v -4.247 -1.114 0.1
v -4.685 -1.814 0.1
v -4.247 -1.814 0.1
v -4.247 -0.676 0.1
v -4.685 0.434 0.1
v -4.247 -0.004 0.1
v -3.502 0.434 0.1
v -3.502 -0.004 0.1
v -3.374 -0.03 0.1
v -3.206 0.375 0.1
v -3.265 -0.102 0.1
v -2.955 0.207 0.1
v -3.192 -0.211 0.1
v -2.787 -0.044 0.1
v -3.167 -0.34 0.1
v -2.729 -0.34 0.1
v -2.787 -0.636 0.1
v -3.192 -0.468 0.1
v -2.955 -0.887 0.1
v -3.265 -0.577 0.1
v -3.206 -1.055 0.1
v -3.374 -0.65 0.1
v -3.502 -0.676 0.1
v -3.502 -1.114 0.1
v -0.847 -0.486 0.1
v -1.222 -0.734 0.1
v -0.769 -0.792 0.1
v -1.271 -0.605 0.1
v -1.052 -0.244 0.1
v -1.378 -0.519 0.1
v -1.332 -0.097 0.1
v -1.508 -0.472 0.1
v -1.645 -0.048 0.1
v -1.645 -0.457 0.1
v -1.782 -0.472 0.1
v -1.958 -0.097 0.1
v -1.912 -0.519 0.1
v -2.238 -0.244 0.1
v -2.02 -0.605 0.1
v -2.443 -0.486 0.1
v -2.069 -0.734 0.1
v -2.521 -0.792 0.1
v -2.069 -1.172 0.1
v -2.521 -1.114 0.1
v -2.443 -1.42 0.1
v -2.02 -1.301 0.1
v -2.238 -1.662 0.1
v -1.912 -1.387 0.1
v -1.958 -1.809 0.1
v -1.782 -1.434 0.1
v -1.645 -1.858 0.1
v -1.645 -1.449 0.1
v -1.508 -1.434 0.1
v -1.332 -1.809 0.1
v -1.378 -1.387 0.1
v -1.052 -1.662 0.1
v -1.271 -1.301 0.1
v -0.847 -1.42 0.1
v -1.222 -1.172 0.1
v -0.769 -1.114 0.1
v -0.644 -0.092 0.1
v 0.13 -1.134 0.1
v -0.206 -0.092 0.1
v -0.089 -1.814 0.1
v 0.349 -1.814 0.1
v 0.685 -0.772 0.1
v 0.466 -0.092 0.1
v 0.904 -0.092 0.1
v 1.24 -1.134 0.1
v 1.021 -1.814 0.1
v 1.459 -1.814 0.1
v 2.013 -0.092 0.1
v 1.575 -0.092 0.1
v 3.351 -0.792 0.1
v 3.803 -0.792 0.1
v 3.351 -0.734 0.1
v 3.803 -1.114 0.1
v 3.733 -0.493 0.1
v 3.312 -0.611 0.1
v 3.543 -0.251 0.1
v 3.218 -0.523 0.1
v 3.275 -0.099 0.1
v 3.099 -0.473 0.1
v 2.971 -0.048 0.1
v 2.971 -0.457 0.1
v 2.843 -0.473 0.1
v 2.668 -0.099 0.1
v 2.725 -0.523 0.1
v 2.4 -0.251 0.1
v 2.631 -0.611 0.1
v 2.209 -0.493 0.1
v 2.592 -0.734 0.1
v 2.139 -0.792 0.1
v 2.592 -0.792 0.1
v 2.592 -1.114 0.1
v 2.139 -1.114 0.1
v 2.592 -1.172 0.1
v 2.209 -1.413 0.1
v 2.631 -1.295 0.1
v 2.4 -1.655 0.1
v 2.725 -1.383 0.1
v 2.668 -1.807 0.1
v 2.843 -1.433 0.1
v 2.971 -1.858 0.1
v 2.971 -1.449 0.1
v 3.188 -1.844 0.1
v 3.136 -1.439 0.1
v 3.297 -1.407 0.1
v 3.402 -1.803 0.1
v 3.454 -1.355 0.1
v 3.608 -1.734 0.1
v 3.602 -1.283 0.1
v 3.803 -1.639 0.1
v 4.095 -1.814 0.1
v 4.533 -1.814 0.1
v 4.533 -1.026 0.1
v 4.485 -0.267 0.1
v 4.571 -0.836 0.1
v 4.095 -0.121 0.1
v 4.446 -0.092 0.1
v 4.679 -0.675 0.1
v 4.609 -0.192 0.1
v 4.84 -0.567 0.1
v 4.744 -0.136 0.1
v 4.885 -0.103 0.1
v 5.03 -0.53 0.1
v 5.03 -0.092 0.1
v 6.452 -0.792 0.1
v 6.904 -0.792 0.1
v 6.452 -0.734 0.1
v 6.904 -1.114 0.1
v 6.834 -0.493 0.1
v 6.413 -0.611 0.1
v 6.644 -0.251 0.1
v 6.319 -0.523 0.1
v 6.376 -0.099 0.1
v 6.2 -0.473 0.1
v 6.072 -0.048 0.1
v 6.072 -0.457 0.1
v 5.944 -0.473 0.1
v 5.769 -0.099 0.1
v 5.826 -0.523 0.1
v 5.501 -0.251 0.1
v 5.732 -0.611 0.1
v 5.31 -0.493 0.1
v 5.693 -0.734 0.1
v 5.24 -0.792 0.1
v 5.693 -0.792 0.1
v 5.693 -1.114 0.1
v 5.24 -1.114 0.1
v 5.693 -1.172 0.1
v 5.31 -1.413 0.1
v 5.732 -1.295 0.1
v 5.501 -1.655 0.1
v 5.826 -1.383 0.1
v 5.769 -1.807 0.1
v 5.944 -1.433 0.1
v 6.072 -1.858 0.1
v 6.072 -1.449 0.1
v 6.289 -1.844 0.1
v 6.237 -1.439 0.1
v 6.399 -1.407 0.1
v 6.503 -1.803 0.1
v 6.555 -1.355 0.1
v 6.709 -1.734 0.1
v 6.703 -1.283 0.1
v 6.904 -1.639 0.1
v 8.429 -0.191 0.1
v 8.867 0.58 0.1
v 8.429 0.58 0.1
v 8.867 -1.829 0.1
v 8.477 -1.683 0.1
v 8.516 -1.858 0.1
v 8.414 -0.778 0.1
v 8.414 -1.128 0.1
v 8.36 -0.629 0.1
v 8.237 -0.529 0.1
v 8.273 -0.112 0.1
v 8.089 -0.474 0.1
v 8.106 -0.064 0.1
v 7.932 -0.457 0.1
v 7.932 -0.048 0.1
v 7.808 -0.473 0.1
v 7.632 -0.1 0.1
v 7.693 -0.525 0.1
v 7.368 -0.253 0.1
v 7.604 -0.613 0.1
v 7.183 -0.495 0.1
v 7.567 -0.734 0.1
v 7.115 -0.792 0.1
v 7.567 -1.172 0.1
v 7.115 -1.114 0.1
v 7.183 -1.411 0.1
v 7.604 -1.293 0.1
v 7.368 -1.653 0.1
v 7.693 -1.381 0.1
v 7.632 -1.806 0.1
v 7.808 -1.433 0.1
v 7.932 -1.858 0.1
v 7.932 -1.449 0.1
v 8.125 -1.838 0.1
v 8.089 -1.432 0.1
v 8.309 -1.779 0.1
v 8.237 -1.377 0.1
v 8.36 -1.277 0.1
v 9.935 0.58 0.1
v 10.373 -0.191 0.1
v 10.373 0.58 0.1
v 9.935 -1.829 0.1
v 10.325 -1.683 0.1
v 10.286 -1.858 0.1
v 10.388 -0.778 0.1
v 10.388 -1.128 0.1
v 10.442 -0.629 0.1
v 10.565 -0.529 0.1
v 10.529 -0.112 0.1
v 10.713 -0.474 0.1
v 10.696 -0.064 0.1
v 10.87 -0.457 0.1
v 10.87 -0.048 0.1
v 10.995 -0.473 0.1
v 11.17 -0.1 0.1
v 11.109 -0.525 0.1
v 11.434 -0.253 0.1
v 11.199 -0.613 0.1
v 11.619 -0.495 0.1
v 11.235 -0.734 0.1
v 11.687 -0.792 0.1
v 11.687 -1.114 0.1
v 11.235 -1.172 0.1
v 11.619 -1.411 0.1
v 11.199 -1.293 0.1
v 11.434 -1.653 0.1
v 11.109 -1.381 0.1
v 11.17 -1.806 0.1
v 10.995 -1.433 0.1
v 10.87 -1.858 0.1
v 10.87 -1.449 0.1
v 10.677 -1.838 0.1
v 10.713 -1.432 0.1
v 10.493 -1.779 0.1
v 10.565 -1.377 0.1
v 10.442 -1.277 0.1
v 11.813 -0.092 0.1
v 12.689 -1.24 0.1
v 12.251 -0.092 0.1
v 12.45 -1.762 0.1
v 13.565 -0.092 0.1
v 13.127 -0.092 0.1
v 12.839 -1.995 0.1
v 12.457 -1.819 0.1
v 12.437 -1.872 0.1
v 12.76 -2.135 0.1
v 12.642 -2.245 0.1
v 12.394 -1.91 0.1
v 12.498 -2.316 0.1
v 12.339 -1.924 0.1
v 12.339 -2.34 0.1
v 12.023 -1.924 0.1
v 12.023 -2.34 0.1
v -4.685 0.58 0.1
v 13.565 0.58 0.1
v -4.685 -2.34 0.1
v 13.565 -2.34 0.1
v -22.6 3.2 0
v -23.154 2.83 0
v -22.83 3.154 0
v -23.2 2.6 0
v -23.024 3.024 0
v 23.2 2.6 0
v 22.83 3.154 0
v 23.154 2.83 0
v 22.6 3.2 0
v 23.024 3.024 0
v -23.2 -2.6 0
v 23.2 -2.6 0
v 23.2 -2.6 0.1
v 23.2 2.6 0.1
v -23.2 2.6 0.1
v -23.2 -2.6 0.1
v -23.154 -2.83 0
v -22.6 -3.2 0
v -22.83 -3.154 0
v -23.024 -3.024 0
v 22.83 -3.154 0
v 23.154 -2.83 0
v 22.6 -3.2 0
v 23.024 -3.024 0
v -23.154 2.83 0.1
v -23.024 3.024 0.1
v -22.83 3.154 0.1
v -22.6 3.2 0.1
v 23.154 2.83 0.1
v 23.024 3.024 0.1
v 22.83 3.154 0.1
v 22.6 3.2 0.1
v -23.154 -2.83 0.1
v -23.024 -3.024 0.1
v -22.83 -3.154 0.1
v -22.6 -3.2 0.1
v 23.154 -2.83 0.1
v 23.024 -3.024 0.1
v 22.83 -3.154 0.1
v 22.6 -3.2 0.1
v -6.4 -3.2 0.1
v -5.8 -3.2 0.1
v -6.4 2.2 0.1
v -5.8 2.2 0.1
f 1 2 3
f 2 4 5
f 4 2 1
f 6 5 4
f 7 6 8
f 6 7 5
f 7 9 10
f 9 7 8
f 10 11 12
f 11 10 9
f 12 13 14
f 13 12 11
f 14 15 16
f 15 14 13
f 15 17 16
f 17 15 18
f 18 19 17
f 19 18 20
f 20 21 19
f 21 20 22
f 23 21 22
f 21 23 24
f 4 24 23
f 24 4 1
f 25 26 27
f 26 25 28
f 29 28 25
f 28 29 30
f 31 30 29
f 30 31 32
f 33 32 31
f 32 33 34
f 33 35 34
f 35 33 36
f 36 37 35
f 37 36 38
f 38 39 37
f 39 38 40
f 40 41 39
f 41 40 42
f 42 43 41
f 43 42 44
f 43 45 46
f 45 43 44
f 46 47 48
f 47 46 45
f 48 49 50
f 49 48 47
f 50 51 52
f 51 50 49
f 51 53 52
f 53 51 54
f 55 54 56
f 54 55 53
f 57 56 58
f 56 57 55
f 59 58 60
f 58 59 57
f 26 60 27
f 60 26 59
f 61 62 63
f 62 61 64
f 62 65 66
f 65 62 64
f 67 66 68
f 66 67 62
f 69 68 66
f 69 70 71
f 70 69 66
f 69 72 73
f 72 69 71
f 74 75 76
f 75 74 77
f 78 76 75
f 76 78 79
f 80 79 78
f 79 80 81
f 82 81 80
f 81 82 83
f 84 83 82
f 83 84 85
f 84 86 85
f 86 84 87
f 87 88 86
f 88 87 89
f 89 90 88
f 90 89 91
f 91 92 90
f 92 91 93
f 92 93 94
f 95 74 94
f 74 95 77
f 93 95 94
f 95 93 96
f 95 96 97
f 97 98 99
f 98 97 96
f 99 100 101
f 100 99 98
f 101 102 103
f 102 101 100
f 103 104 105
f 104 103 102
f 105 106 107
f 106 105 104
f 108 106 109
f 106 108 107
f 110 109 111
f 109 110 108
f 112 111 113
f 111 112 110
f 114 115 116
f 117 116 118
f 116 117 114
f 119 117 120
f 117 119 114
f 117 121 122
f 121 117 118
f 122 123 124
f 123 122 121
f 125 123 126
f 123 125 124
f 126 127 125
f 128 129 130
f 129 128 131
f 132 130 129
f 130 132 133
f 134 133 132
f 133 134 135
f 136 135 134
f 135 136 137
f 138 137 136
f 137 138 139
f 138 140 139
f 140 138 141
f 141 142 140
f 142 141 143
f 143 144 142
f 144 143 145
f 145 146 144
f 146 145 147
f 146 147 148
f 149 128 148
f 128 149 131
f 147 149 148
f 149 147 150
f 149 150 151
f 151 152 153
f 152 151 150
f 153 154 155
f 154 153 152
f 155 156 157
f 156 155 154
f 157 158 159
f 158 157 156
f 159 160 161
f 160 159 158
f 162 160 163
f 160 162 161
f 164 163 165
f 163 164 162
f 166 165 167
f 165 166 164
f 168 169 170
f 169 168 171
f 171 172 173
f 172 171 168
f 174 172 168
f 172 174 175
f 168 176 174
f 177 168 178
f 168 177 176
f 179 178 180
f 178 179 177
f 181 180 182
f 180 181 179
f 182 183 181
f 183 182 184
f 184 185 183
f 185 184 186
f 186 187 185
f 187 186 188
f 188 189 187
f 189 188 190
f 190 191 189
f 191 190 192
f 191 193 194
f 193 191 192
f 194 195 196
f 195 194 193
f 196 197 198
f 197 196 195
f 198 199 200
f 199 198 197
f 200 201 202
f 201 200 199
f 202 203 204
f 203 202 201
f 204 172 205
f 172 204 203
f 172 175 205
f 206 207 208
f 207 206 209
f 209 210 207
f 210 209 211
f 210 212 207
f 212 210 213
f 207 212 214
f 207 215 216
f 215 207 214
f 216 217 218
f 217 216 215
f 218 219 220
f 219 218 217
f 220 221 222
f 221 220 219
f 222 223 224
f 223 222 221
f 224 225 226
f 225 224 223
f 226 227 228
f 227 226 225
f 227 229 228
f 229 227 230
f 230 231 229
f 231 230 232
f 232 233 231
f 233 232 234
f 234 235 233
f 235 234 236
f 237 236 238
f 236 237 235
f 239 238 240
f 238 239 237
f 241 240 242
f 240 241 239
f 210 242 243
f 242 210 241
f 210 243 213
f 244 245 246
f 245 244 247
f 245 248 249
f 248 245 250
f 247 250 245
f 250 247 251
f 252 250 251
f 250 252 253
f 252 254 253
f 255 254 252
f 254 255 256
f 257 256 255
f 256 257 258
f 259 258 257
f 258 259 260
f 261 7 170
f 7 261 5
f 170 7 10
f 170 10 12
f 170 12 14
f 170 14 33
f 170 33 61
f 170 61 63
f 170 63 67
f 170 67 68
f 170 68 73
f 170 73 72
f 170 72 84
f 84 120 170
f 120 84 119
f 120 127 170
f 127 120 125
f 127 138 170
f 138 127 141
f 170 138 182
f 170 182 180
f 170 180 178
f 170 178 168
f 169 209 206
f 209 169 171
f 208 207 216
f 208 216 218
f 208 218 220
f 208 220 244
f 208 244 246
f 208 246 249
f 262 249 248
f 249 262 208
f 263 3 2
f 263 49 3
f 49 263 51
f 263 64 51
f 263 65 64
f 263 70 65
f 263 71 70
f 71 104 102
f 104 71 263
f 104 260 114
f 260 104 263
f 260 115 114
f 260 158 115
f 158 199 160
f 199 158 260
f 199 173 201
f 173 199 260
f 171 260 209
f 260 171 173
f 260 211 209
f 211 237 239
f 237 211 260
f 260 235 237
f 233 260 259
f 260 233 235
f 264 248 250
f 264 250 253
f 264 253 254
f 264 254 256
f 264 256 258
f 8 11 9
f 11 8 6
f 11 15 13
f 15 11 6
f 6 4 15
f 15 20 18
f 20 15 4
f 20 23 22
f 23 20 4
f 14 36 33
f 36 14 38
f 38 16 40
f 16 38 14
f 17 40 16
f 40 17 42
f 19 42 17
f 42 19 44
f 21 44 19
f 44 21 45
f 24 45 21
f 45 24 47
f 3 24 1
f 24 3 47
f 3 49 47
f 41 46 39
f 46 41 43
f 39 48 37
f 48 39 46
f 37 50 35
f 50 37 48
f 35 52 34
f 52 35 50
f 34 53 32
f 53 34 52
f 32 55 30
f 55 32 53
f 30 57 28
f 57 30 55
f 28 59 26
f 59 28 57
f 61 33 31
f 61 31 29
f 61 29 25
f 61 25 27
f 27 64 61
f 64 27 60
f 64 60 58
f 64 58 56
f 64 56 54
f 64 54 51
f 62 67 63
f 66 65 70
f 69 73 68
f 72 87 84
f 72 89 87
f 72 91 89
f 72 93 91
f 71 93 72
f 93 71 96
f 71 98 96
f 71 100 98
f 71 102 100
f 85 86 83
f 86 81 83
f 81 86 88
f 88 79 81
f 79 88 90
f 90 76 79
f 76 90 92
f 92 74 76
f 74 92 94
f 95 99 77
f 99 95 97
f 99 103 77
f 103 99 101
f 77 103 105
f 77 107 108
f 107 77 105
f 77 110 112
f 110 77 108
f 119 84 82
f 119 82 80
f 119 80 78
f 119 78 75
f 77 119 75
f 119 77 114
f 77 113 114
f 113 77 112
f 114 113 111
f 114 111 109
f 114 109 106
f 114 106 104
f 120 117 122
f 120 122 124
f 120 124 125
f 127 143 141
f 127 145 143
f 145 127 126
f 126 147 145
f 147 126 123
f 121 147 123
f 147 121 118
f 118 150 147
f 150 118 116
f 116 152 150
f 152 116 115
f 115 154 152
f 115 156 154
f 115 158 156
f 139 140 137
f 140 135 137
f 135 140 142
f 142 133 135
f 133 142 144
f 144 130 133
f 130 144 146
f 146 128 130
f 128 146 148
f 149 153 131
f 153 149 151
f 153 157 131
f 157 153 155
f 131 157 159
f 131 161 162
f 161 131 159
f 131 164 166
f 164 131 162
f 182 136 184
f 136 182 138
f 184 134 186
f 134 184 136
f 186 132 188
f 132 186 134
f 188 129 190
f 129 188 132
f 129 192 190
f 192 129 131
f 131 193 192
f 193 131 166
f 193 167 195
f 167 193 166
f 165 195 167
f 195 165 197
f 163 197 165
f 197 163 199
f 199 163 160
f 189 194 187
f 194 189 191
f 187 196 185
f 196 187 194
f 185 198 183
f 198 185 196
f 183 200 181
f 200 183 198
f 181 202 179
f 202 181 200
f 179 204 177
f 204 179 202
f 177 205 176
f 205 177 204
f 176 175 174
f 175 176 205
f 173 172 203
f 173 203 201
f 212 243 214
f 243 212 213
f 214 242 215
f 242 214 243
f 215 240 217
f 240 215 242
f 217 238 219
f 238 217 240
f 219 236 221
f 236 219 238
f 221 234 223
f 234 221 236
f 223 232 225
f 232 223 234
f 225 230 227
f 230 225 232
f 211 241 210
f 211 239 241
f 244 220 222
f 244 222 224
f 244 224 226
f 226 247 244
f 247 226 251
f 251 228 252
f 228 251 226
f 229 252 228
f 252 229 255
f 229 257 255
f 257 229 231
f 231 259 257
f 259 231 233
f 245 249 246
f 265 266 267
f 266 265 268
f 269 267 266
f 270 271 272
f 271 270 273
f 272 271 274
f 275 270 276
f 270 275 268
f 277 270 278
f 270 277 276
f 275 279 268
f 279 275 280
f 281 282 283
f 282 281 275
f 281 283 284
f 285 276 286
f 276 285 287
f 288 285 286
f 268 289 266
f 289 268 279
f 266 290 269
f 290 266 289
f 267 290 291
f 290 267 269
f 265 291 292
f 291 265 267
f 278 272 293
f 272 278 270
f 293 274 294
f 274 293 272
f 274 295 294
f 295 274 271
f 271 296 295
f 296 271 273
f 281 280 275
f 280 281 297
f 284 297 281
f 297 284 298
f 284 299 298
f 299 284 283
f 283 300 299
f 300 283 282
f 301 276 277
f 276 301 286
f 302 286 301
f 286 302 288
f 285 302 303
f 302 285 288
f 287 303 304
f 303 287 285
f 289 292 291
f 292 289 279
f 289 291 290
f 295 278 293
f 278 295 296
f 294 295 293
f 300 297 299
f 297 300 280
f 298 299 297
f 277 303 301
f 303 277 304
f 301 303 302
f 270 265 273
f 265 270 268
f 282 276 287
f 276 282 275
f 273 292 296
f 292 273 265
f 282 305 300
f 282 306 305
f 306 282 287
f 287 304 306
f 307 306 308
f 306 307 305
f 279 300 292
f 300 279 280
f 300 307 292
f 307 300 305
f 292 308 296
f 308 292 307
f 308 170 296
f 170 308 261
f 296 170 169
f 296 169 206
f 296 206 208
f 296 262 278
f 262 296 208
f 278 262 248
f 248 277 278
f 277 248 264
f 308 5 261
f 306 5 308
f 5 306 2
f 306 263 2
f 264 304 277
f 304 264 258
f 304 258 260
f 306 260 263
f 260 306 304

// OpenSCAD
// file: ../p/box3u12.scad
use <../lib.scad>
function ldraw_lib__box3u12() = [
// 0 Box with 3 Parallel Faces without Any Edges
// 0 Name: box3u12.dat
// 0 Author: J.C. Tchang [tchang]
// 0 !LDRAW_ORG Primitive UPDATE 2014-02
// 0 !LICENSE Licensed under CC BY 4.0 : see CAreadme.txt
// 
// 0 BFC CERTIFY CCW
  [0,"BFC","CERTIFY"],
  [0,"BFC","CCW"],
// 
// 0 !HISTORY 2014-12-23 [PTadmin] Official Update 2014-02
// 
// 
// 4 16 -1 1 1 1 1 1 1 1 -1 -1 1 -1
  [4,16,-1,1,1,1,1,1,1,1,-1,-1,1,-1],
// 4 16 -1 1 1 -1 0 1 1 0 1 1 1 1
  [4,16,-1,1,1,-1,0,1,1,0,1,1,1,1],
// 4 16 1 1 -1 1 0 -1 -1 0 -1 -1 1 -1
  [4,16,1,1,-1,1,0,-1,-1,0,-1,-1,1,-1],
];
module ldraw_lib__box3u12(step=0, col=false, unit=2/5, alt=false, line=0.2, solid=!$preview)
    makepoly(ldraw_lib__box3u12(), step=step, col=col, unit=unit, alt=alt, line=line, solid=solid);
ldraw_lib__box3u12(line=0.2);
// file: ../p/1-4cyli.scad
use <../lib.scad>
function ldraw_lib__1_4cyli() = [
// 0 Cylinder 0.25
// 0 Name: 1-4cyli.dat
// 0 Author: James Jessiman
// 0 !LDRAW_ORG Primitive UPDATE 2012-01
// 0 !LICENSE Licensed under CC BY 4.0 : see CAreadme.txt
// 
// 0 BFC CERTIFY CCW
  [0,"BFC","CERTIFY"],
  [0,"BFC","CCW"],
// 
// 0 !HISTORY 2002-03-23 [sbliss] Added BFC statement.
// 0 !HISTORY 2002-04-25 [PTadmin] Official Update 2002-02
// 0 !HISTORY 2007-06-22 [PTadmin] Header formatted for Contributor Agreement
// 0 !HISTORY 2008-07-01 [PTadmin] Official Update 2008-01
// 0 !HISTORY 2012-02-16 [Philo] Changed to CCW
// 0 !HISTORY 2012-03-30 [PTadmin] Official Update 2012-01
// 
// 
// 4 16 1 1 0 0.9239 1 0.3827 0.9239 0 0.3827 1 0 0
  [4,16,1,1,0,0.9239,1,0.3827,0.9239,0,0.3827,1,0,0],
// 5 24 1 0 0 1 1 0 0.9239 0 0.3827 1 0 -1
  [5,24,1,0,0,1,1,0,0.9239,0,0.3827,1,0,-1],
// 4 16 0.9239 1 0.3827 0.7071 1 0.7071 0.7071 0 0.7071 0.9239 0 0.3827
  [4,16,0.9239,1,0.3827,0.7071,1,0.7071,0.7071,0,0.7071,0.9239,0,0.3827],
// 5 24 0.9239 0 0.3827 0.9239 1 0.3827 0.7071 0 0.7071 1 0 0
  [5,24,0.9239,0,0.3827,0.9239,1,0.3827,0.7071,0,0.7071,1,0,0],
// 4 16 0.7071 1 0.7071 0.3827 1 0.9239 0.3827 0 0.9239 0.7071 0 0.7071
  [4,16,0.7071,1,0.7071,0.3827,1,0.9239,0.3827,0,0.9239,0.7071,0,0.7071],
// 5 24 0.7071 0 0.7071 0.7071 1 0.7071 0.3827 0 0.9239 0.9239 0 0.3827
  [5,24,0.7071,0,0.7071,0.7071,1,0.7071,0.3827,0,0.9239,0.9239,0,0.3827],
// 4 16 0.3827 1 0.9239 0 1 1 0 0 1 0.3827 0 0.9239
  [4,16,0.3827,1,0.9239,0,1,1,0,0,1,0.3827,0,0.9239],
// 5 24 0.3827 0 0.9239 0.3827 1 0.9239 0 0 1 0.7071 0 0.7071
  [5,24,0.3827,0,0.9239,0.3827,1,0.9239,0,0,1,0.7071,0,0.7071],
// 5 24 0 0 1 0 1 1 0.3827 0 0.9239 -1 0 1
  [5,24,0,0,1,0,1,1,0.3827,0,0.9239,-1,0,1],
];
module ldraw_lib__1_4cyli(step=0, col=false, unit=2/5, alt=false, line=0.2, solid=!$preview)
    makepoly(ldraw_lib__1_4cyli(), step=step, col=col, unit=unit, alt=alt, line=line, solid=solid);
ldraw_lib__1_4cyli(line=0.2);
// file: ../p/1-4chrd.scad
use <../lib.scad>
function ldraw_lib__1_4chrd() = [
// 0 Chord 0.25
// 0 Name: 1-4chrd.dat
// 0 Author: Max Martin Richter [MMR1988]
// 0 !LDRAW_ORG Primitive UPDATE 2023-05
// 0 !LICENSE Licensed under CC BY 4.0 : see CAreadme.txt
// 
// 0 BFC CERTIFY CCW
  [0,"BFC","CERTIFY"],
  [0,"BFC","CCW"],
// 
// 0 !HISTORY 2004-04-22 [PTadmin] Official Update 2004-02
// 0 !HISTORY 2007-10-09 [PTadmin] Header formatted for Contributor Agreement
// 0 !HISTORY 2008-07-01 [PTadmin] Official Update 2008-01
// 0 !HISTORY 2012-08-02 [MMR1988] Re-creation with PrimGen2 and Rectifier
// 0 !HISTORY 2012-08-09 [PTadmin] Official Update 2012-02
// 0 !HISTORY 2023-10-27 [OrionP] Change author to MMR1988 from hafhead
// 0 !HISTORY 2023-10-31 [OrionP] Official Update 2023-05
// 
// 4 16 0.9239 0 0.3827 0.3827 0 0.9239 0 0 1 1 0 0
  [4,16,0.9239,0,0.3827,0.3827,0,0.9239,0,0,1,1,0,0],
// 3 16 0.7071 0 0.7071 0.3827 0 0.9239 0.9239 0 0.3827
  [3,16,0.7071,0,0.7071,0.3827,0,0.9239,0.9239,0,0.3827],
];
module ldraw_lib__1_4chrd(step=0, col=false, unit=2/5, alt=false, line=0.2, solid=!$preview)
    makepoly(ldraw_lib__1_4chrd(), step=step, col=col, unit=unit, alt=alt, line=line, solid=solid);
ldraw_lib__1_4chrd(line=0.2);
// main file
use <../lib.scad>
use <../p/1-4chrd.scad>
use <../p/1-4cyli.scad>
use <../p/box3u12.scad>
use <s/logo-ecoboost-powered-by-box.scad>
use <s/logo-ecoboost-powered-by.scad>
function ldraw_lib__6177969o() = [
// 0 Sticker  0.8 x  5.8 with Black "Powered by" Text on White Bakcground
// 0 Name: 6177969o.dat
// 0 Author: Massimo Maso [Sirio]
// 0 !LDRAW_ORG Part UPDATE 2024-09
// 0 !LICENSE Licensed under CC BY 4.0 : see CAreadme.txt
// 
// 0 BFC CERTIFY CCW
  [0,"BFC","CERTIFY"],
  [0,"BFC","CCW"],
// 
// 0 !KEYWORDS 2016, Bricklink 75881stk01, Brickowl 507382, Ford, GT
// 0 !KEYWORDS Rebrickable 30897, Set 75881, Speed Champions
// 
// 0 !HISTORY 2024-10-27 [OrionP] Official Update 2024-09
// 
// 
// 0 // Logo primitives
// 1 0 11.1 -.25 -2.2 .73 0 0 0 1 0 0 0 .73 s\logo-ecoboost-powered-by.dat
  [1,0,11.1,-.25,-2.2,.73,0,0,0,1,0,0,0,.73, ldraw_lib__s__logo_ecoboost_powered_by()],
// 1 15 11.1 -.25 -2.2 .73 0 0 0 1 0 0 0 .73 s\logo-ecoboost-powered-by-box.dat
  [1,15,11.1,-.25,-2.2,.73,0,0,0,1,0,0,0,.73, ldraw_lib__s__logo_ecoboost_powered_by_box()],
// 0 // Primitives
// 1 16 -56.5 0 6.5 -1.5 0 0 0 -1 0 0 0 1.5 1-4chrd.dat
  [1,16,-56.5,0,6.5,-1.5,0,0,0,-1,0,0,0,1.5, ldraw_lib__1_4chrd()],
// 1 16 56.5 0 6.5 1.5 0 0 0 -1 0 0 0 1.5 1-4chrd.dat
  [1,16,56.5,0,6.5,1.5,0,0,0,-1,0,0,0,1.5, ldraw_lib__1_4chrd()],
// 1 16 0 -.25 0 0 0 58 0 .25 0 6.5 0 0 box3u12.dat
  [1,16,0,-.25,0,0,0,58,0,.25,0,6.5,0,0, ldraw_lib__box3u12()],
// 1 16 -56.5 0 -6.5 -1.5 0 0 0 -1 0 0 0 -1.5 1-4chrd.dat
  [1,16,-56.5,0,-6.5,-1.5,0,0,0,-1,0,0,0,-1.5, ldraw_lib__1_4chrd()],
// 1 16 56.5 0 -6.5 1.5 0 0 0 -1 0 0 0 -1.5 1-4chrd.dat
  [1,16,56.5,0,-6.5,1.5,0,0,0,-1,0,0,0,-1.5, ldraw_lib__1_4chrd()],
// 1 16 -56.5 0 6.5 -1.5 0 0 0 -.25 0 0 0 1.5 1-4cyli.dat
  [1,16,-56.5,0,6.5,-1.5,0,0,0,-.25,0,0,0,1.5, ldraw_lib__1_4cyli()],
// 1 16 56.5 0 6.5 1.5 0 0 0 -.25 0 0 0 1.5 1-4cyli.dat
  [1,16,56.5,0,6.5,1.5,0,0,0,-.25,0,0,0,1.5, ldraw_lib__1_4cyli()],
// 1 16 -56.5 0 -6.5 -1.5 0 0 0 -.25 0 0 0 -1.5 1-4cyli.dat
  [1,16,-56.5,0,-6.5,-1.5,0,0,0,-.25,0,0,0,-1.5, ldraw_lib__1_4cyli()],
// 1 16 56.5 0 -6.5 1.5 0 0 0 -.25 0 0 0 -1.5 1-4cyli.dat
  [1,16,56.5,0,-6.5,1.5,0,0,0,-.25,0,0,0,-1.5, ldraw_lib__1_4cyli()],
// 1 15 -56.5 -.25 6.5 -1.5 0 0 0 1 0 0 0 1.5 1-4chrd.dat
  [1,15,-56.5,-.25,6.5,-1.5,0,0,0,1,0,0,0,1.5, ldraw_lib__1_4chrd()],
// 1 15 56.5 -.25 6.5 1.5 0 0 0 1 0 0 0 1.5 1-4chrd.dat
  [1,15,56.5,-.25,6.5,1.5,0,0,0,1,0,0,0,1.5, ldraw_lib__1_4chrd()],
// 1 15 -56.5 -.25 -6.5 -1.5 0 0 0 1 0 0 0 -1.5 1-4chrd.dat
  [1,15,-56.5,-.25,-6.5,-1.5,0,0,0,1,0,0,0,-1.5, ldraw_lib__1_4chrd()],
// 1 15 56.5 -.25 -6.5 1.5 0 0 0 1 0 0 0 -1.5 1-4chrd.dat
  [1,15,56.5,-.25,-6.5,1.5,0,0,0,1,0,0,0,-1.5, ldraw_lib__1_4chrd()],
// 0 // Bottom face
// 4 16 -58 0 6.5 -56.5 0 8 56.5 0 8 58 0 6.5
  [4,16,-58,0,6.5,-56.5,0,8,56.5,0,8,58,0,6.5],
// 4 16 -58 0 -6.5 58 0 -6.5 56.5 0 -8 -56.5 0 -8
  [4,16,-58,0,-6.5,58,0,-6.5,56.5,0,-8,-56.5,0,-8],
// 0 // Lateral face
// 4 16 -56.5 0 8 -56.5 -.25 8 56.5 -.25 8 56.5 0 8
  [4,16,-56.5,0,8,-56.5,-.25,8,56.5,-.25,8,56.5,0,8],
// 3 16 -56.5 0 -8 -16 -.25 -8 -56.5 -.25 -8
  [3,16,-56.5,0,-8,-16,-.25,-8,-56.5,-.25,-8],
// 4 16 -56.5 0 -8 56.5 0 -8 -14.5 -.25 -8 -16 -.25 -8
  [4,16,-56.5,0,-8,56.5,0,-8,-14.5,-.25,-8,-16,-.25,-8],
// 3 16 56.5 0 -8 56.5 -.25 -8 -14.5 -.25 -8
  [3,16,56.5,0,-8,56.5,-.25,-8,-14.5,-.25,-8],
// 0 // Top face
// 0 // Black face
// 4 0 -16 -.25 5.5 -16 -.25 -8 -14.5 -.25 -8 -14.5 -.25 5.5
  [4,0,-16,-.25,5.5,-16,-.25,-8,-14.5,-.25,-8,-14.5,-.25,5.5],
// 0 // White faces
// 4 15 -56.5 -.25 8 -58 -.25 6.5 -58 -.25 -6.5 -56.5 -.25 -8
  [4,15,-56.5,-.25,8,-58,-.25,6.5,-58,-.25,-6.5,-56.5,-.25,-8],
// 4 15 -56.5 -.25 8 -56.5 -.25 -8 -16 -.25 -8 -16 -.25 5.5
  [4,15,-56.5,-.25,8,-56.5,-.25,-8,-16,-.25,-8,-16,-.25,5.5],
// 4 15 -56.5 -.25 8 -16 -.25 5.5 -14.5 -.25 5.5 56.5 -.25 8
  [4,15,-56.5,-.25,8,-16,-.25,5.5,-14.5,-.25,5.5,56.5,-.25,8],
// 4 15 56.5 -.25 8 -14.5 -.25 5.5 -11.7125 -.25 1.45 21.0718 -.25 1.45
  [4,15,56.5,-.25,8,-14.5,-.25,5.5,-11.7125,-.25,1.45,21.0718,-.25,1.45],
// 3 15 56.5 -.25 8 21.0718 -.25 1.45 22.1668 -.25 1.45
  [3,15,56.5,-.25,8,21.0718,-.25,1.45,22.1668,-.25,1.45],
// 3 15 56.5 -.25 8 22.1668 -.25 1.45 24.8386 -.25 1.45
  [3,15,56.5,-.25,8,22.1668,-.25,1.45,24.8386,-.25,1.45],
// 3 15 56.5 -.25 8 24.8386 -.25 1.45 25.9336 -.25 1.45
  [3,15,56.5,-.25,8,24.8386,-.25,1.45,25.9336,-.25,1.45],
// 4 15 56.5 -.25 8 25.9336 -.25 1.45 33.9125 -.25 1.45 58 -.25 6.5
  [4,15,56.5,-.25,8,25.9336,-.25,1.45,33.9125,-.25,1.45,58,-.25,6.5],
// 3 15 58 -.25 6.5 33.9125 -.25 1.45 33.9125 -.25 -.229
  [3,15,58,-.25,6.5,33.9125,-.25,1.45,33.9125,-.25,-.229],
// 4 15 58 -.25 6.5 33.9125 -.25 -.229 33.9125 -.25 -5.85 58 -.25 -6.5
  [4,15,58,-.25,6.5,33.9125,-.25,-.229,33.9125,-.25,-5.85,58,-.25,-6.5],
// 3 15 -14.5 -.25 5.5 -11.7125 -.25 1.085 -11.7125 -.25 1.45
  [3,15,-14.5,-.25,5.5,-11.7125,-.25,1.085,-11.7125,-.25,1.45],
// 4 15 -14.5 -.25 5.5 -14.5 -.25 -8 -11.7125 -.25 -4.536 -11.7125 -.25 1.085
  [4,15,-14.5,-.25,5.5,-14.5,-.25,-8,-11.7125,-.25,-4.536,-11.7125,-.25,1.085],
// 3 15 -14.5 -.25 -8 -11.7125 -.25 -5.85 -11.7125 -.25 -4.536
  [3,15,-14.5,-.25,-8,-11.7125,-.25,-5.85,-11.7125,-.25,-4.536],
// 4 15 56.5 -.25 -8 58 -.25 -6.5 33.9125 -.25 -5.85 30.8465 -.25 -5.85
  [4,15,56.5,-.25,-8,58,-.25,-6.5,33.9125,-.25,-5.85,30.8465,-.25,-5.85],
// 3 15 56.5 -.25 -8 30.8465 -.25 -5.85 30.0581 -.25 -5.85
  [3,15,56.5,-.25,-8,30.8465,-.25,-5.85,30.0581,-.25,-5.85],
// 4 15 56.5 -.25 -8 30.0581 -.25 -5.85 -11.7125 -.25 -5.85 -14.5 -.25 -8
  [4,15,56.5,-.25,-8,30.0581,-.25,-5.85,-11.7125,-.25,-5.85,-14.5,-.25,-8],
];
module ldraw_lib__6177969o(step=0, col=false, unit=2/5, alt=false, line=0.2, solid=!$preview)
    makepoly(ldraw_lib__6177969o(), step=step, col=col, unit=unit, alt=alt, line=line, solid=solid);
ldraw_lib__6177969o(line=0.2);
